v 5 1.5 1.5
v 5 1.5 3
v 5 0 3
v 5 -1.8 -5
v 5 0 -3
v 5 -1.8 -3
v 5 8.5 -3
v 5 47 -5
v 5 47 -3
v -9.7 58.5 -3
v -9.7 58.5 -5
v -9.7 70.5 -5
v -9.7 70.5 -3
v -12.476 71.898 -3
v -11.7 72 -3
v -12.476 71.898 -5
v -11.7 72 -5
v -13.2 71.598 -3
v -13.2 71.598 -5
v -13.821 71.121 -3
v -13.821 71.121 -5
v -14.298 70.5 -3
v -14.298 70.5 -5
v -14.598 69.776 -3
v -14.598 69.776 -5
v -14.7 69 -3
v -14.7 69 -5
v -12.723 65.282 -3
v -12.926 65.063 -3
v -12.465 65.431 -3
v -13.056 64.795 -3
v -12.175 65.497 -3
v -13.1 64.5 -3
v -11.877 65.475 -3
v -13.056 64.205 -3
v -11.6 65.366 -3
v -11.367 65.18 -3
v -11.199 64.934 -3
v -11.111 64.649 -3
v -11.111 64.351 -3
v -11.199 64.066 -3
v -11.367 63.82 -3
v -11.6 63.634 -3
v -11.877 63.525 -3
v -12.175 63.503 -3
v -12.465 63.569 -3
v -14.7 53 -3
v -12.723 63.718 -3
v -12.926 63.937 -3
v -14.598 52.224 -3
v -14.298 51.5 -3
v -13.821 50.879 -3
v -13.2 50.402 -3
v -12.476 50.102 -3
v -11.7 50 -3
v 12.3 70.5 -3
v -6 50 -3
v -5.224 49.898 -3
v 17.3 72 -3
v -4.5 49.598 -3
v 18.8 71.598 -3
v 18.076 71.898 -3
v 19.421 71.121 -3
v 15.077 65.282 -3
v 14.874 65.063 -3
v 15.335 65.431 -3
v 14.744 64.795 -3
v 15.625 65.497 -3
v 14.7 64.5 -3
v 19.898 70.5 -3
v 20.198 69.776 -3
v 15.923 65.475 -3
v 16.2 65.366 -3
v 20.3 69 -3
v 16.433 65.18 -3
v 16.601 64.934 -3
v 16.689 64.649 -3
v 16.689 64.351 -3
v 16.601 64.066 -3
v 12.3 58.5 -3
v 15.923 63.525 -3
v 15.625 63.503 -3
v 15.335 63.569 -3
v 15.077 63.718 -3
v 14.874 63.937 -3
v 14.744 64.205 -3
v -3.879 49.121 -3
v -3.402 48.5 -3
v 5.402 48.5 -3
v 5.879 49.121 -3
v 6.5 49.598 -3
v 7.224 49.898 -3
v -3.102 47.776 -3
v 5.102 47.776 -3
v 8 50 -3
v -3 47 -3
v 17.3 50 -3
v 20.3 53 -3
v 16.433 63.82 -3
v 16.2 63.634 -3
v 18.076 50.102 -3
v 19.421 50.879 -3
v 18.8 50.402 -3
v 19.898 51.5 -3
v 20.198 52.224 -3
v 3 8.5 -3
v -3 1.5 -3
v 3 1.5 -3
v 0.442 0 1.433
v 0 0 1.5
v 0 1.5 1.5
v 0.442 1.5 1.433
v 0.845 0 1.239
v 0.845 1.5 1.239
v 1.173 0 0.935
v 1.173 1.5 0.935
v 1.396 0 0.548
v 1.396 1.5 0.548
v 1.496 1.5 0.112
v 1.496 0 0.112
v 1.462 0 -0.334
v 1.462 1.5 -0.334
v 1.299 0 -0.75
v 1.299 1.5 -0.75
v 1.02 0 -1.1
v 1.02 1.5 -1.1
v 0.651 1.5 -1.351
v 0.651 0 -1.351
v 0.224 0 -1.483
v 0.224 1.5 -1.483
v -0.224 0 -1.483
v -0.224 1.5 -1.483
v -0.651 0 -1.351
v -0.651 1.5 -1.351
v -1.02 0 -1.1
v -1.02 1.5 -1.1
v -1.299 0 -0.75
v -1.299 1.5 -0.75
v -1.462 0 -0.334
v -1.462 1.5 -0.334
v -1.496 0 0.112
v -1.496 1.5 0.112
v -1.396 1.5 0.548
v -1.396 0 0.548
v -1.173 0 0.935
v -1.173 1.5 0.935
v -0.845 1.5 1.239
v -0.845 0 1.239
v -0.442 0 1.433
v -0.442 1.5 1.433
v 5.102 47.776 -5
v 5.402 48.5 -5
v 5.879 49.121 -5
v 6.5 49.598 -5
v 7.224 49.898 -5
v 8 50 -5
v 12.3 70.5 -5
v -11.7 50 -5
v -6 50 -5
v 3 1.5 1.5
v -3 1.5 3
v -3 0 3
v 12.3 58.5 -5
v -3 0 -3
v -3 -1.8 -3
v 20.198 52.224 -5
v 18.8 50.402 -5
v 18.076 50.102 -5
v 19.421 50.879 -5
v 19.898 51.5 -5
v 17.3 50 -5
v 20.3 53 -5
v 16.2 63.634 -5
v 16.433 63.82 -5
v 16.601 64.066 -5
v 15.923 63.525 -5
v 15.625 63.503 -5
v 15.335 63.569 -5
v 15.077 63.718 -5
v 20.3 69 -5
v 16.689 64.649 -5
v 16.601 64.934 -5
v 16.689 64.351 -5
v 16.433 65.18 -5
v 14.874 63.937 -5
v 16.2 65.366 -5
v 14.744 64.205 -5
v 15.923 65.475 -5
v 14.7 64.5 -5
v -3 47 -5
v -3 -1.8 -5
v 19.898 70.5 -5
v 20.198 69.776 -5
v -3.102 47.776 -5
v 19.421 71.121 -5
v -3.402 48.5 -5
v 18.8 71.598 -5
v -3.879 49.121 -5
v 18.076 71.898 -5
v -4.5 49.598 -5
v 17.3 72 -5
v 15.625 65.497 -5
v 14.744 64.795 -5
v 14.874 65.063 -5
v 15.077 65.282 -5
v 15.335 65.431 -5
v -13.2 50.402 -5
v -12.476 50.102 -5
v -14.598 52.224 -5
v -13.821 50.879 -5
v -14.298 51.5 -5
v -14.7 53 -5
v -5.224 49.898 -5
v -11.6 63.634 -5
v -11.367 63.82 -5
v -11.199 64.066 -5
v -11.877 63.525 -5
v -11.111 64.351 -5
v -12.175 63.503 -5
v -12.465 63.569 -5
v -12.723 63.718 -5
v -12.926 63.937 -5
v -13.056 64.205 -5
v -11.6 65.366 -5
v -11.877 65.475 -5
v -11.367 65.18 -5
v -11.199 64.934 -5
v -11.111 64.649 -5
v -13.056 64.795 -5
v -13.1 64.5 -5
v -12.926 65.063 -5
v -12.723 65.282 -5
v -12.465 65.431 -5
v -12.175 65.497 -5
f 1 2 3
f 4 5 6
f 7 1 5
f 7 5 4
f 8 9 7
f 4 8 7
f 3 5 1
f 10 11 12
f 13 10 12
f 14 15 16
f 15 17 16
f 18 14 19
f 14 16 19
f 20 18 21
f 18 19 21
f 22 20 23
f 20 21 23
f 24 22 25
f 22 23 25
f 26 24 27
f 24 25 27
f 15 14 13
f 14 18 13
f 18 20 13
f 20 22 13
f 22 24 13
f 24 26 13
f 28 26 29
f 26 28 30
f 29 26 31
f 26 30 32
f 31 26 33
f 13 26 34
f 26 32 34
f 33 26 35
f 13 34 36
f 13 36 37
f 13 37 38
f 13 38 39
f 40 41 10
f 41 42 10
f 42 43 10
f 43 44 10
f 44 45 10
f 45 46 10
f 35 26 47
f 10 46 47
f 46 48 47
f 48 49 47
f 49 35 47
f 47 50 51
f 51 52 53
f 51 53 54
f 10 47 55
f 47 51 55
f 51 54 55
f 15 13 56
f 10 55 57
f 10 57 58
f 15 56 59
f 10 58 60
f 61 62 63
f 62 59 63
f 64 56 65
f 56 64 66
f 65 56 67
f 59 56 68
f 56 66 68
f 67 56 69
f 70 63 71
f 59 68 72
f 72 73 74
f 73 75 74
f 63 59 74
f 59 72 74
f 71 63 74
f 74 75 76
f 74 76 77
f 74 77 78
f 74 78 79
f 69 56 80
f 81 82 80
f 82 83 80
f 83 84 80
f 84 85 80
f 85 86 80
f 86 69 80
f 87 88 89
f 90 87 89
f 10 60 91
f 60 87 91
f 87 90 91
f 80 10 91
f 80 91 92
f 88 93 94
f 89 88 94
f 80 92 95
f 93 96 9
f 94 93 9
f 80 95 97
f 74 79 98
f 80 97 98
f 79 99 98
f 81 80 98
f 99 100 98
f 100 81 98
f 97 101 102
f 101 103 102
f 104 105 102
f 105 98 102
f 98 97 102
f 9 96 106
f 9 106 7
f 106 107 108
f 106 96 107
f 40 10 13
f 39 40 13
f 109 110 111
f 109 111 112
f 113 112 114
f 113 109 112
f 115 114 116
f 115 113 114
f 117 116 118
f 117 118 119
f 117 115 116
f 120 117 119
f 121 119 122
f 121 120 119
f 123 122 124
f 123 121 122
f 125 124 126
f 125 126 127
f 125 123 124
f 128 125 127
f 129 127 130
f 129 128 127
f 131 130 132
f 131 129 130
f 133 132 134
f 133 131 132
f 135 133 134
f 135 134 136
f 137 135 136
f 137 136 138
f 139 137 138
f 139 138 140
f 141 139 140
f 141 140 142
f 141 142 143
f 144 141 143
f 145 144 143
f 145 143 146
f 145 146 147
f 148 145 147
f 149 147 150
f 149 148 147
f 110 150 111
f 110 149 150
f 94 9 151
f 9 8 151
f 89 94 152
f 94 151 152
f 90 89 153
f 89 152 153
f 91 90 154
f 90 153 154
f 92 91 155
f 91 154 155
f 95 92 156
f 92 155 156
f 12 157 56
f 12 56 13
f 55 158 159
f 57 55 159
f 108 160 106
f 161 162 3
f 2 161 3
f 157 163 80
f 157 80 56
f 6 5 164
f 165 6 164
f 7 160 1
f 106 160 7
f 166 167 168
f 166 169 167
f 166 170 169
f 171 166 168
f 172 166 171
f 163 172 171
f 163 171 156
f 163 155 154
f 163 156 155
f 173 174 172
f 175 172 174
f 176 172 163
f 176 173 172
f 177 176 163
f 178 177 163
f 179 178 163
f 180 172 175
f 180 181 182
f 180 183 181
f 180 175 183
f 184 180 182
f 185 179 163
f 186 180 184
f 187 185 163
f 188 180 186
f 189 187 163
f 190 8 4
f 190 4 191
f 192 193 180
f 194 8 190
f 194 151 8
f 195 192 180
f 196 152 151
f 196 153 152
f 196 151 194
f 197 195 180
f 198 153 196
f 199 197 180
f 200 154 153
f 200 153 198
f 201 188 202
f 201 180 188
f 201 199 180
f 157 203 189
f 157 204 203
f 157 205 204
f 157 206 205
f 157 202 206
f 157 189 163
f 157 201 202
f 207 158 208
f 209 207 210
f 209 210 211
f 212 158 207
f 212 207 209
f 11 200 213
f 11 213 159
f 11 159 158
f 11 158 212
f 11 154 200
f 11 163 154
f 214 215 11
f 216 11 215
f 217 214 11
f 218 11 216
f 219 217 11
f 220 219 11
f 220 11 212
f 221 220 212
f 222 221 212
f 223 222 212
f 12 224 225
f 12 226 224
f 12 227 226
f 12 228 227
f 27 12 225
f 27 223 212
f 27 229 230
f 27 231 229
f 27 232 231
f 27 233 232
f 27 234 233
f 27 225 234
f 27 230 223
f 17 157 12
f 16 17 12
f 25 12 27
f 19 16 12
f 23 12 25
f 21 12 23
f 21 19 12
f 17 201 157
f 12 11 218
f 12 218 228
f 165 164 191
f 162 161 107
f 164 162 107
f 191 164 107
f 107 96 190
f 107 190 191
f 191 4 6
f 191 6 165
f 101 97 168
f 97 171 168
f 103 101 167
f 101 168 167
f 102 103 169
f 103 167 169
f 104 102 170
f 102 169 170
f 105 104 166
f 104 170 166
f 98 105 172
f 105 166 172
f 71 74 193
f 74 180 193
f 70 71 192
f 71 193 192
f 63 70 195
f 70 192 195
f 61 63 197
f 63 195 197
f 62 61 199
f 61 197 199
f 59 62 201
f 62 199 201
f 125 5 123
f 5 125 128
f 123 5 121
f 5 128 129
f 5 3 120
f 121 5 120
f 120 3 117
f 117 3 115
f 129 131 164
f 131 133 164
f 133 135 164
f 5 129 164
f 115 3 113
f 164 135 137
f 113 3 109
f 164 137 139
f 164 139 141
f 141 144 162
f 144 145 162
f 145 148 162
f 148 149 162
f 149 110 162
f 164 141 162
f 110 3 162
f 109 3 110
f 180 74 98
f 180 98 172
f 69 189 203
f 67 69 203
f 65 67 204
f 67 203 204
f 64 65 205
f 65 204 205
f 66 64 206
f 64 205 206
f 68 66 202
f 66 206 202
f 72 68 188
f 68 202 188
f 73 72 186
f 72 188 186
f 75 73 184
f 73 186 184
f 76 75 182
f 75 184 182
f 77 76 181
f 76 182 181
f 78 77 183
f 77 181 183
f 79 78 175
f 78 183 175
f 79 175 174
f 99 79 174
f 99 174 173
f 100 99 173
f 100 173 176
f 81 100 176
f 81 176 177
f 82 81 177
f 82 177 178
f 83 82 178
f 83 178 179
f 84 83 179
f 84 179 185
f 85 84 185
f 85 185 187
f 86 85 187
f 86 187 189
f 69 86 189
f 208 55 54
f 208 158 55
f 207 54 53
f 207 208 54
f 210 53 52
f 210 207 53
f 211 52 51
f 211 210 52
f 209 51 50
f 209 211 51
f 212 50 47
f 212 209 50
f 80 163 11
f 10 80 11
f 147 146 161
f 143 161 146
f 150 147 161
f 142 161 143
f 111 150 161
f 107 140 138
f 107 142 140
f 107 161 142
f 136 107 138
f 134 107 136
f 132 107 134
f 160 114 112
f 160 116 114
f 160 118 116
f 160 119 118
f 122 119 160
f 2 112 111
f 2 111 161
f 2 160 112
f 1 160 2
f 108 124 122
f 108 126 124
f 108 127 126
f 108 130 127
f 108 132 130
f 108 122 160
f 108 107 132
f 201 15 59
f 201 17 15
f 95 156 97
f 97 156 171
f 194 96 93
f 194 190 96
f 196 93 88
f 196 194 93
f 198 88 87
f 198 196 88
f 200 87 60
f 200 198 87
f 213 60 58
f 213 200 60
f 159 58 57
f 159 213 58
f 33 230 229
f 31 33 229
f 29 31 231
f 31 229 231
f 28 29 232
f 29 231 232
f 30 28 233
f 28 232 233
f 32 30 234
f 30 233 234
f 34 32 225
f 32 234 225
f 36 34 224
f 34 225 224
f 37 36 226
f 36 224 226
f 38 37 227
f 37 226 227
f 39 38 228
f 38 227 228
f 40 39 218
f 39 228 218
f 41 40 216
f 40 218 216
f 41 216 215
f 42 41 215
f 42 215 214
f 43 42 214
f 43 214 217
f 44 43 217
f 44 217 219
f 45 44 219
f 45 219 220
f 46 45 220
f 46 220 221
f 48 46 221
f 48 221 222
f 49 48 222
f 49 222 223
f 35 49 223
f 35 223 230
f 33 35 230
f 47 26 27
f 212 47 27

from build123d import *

# Parameters (mm, degrees)
SKETCH_6_W          = 8
SKETCH_6_H          = 6
SKETCH_6_R          = 1.5
EXTRUDE_1_DEPTH     = 1.5
SKETCH_7_W          = 8
SKETCH_7_H          = 25
EXTRUDE_2_DEPTH     = 2
SKETCH_8_W          = 35
SKETCH_8_H          = 2
EXTRUDE_3_DEPTH     = 22
SKETCH_9_W          = 22
SKETCH_9_H          = 12
CUT_EXTRUDE_1_DEPTH = 10
SKETCH_14_W         = 8
SKETCH_14_H         = 6
CUT_EXTRUDE_2_DEPTH = 4.6
RIB_3_REACH         = 76.814
SKETCH_15_WALL_W    = 159.949062396
SKETCH_15_WALL_H    = 2
FILLET_2_R          = 3
SKETCH_16_W         = 8
SKETCH_16_H         = 2
EXTRUDE_4_DEPTH     = 1.8
SKETCH_17_R         = 1
CUT_EXTRUDE_3_DEPTH = 10


with BuildPart() as part:
    # 草图6 → 凸台-拉伸1 (new body)
    with BuildSketch(Plane(origin=(0, 0, 0), x_dir=(1, 0, 0), z_dir=(0, 1, 0))):
        with Locations((1, 0)):
            Rectangle(SKETCH_6_W, SKETCH_6_H)
        with Locations(Location((0, 0, 0), (0, 0, 270))):
            Circle(SKETCH_6_R, mode=Mode.SUBTRACT)
    extrude(amount=EXTRUDE_1_DEPTH)

    # 草图7 → 凸台-拉伸2 (add)
    with BuildSketch(Plane(origin=(0, 0, -3), x_dir=(-1, 0, 0), z_dir=(0, 0, -1))):
        with Locations((-1, 12.5)):
            Rectangle(SKETCH_7_W, SKETCH_7_H)
    extrude(amount=EXTRUDE_2_DEPTH)

    # 镜向1: part across plane


with BuildPart() as part_1:
    add(part.part)
    add(part.part.mirror(Plane(origin=(-3, 25, -5), x_dir=(0, 0, 1), z_dir=(0, -1, 0))))

    # 草图8 → 凸台-拉伸3 (add)
    with BuildSketch(Plane(origin=(0, 50, 0), x_dir=(1, 0, 0), z_dir=(0, 1, 0))):
        with Locations((2.8, 4)):
            Rectangle(SKETCH_8_W, SKETCH_8_H)
    extrude(amount=EXTRUDE_3_DEPTH)

    # 草图9 → 切除-拉伸1 (cut)
    with BuildSketch(Plane(origin=(0, 0, -5), x_dir=(-1, 0, 0), z_dir=(0, 0, -1))):
        with Locations((-1.3, 64.5)):
            Rectangle(SKETCH_9_W, SKETCH_9_H)
    extrude(amount=-CUT_EXTRUDE_1_DEPTH, mode=Mode.SUBTRACT)

    # 草图14 → 切除-拉伸2 (cut)
    with BuildSketch(Plane(origin=(0, 50, 0), x_dir=(1, 0, 0), z_dir=(0, 1, 0))):
        with Locations((1, 0)):
            Rectangle(SKETCH_14_W, SKETCH_14_H)
    extrude(amount=-CUT_EXTRUDE_2_DEPTH, mode=Mode.SUBTRACT)

    # 草图15 wall → 筋3 (add, up to next)
    with BuildSketch(Plane(origin=(5, 5, -0.75), x_dir=(0, 0.841178475377, -0.540757591313), z_dir=(0, 0.540757591313, 0.841178475377)), mode=Mode.PRIVATE) as rib_3_sk1:
        with Locations((0, 1)):
            Rectangle(SKETCH_15_WALL_W, SKETCH_15_WALL_H)
    rib_3_tool1 = extrude(rib_3_sk1.sketch, amount=-RIB_3_REACH, mode=Mode.PRIVATE) - part_1.part
    add(rib_3_tool1.solids().sort_by_distance((5, 5, -0.75))[0])

    # 圆角2
    fillet_2_edges = [part_1.edges().sort_by_distance(p)[0] for p in [
        (-3, 50, -4),
        (5, 50, -4),
        (-14.7, 50, -4),
        (20.3, 50, -4),
        (-14.7, 72, -4),
        (20.3, 72, -4),
    ]]
    fillet(fillet_2_edges, radius=FILLET_2_R)

    # 草图16 → 凸台-拉伸4 (add)
    with BuildSketch(Plane(origin=(0, 0, 0), x_dir=(-1, 0, 0), z_dir=(0, -1, 0))):
        with Locations((-1, 4)):
            Rectangle(SKETCH_16_W, SKETCH_16_H)
    extrude(amount=EXTRUDE_4_DEPTH)

    # 草图17 → 切除-拉伸3 (cut)
    with BuildSketch(Plane(origin=(0, 0, -5), x_dir=(-1, 0, 0), z_dir=(0, 0, -1))):
        with Locations((-15.7, 64.5)):
            Circle(SKETCH_17_R)
        with Locations((12.1, 64.5)):
            Circle(SKETCH_17_R)
    extrude(amount=-CUT_EXTRUDE_3_DEPTH, mode=Mode.SUBTRACT)


solid = part_1.part
